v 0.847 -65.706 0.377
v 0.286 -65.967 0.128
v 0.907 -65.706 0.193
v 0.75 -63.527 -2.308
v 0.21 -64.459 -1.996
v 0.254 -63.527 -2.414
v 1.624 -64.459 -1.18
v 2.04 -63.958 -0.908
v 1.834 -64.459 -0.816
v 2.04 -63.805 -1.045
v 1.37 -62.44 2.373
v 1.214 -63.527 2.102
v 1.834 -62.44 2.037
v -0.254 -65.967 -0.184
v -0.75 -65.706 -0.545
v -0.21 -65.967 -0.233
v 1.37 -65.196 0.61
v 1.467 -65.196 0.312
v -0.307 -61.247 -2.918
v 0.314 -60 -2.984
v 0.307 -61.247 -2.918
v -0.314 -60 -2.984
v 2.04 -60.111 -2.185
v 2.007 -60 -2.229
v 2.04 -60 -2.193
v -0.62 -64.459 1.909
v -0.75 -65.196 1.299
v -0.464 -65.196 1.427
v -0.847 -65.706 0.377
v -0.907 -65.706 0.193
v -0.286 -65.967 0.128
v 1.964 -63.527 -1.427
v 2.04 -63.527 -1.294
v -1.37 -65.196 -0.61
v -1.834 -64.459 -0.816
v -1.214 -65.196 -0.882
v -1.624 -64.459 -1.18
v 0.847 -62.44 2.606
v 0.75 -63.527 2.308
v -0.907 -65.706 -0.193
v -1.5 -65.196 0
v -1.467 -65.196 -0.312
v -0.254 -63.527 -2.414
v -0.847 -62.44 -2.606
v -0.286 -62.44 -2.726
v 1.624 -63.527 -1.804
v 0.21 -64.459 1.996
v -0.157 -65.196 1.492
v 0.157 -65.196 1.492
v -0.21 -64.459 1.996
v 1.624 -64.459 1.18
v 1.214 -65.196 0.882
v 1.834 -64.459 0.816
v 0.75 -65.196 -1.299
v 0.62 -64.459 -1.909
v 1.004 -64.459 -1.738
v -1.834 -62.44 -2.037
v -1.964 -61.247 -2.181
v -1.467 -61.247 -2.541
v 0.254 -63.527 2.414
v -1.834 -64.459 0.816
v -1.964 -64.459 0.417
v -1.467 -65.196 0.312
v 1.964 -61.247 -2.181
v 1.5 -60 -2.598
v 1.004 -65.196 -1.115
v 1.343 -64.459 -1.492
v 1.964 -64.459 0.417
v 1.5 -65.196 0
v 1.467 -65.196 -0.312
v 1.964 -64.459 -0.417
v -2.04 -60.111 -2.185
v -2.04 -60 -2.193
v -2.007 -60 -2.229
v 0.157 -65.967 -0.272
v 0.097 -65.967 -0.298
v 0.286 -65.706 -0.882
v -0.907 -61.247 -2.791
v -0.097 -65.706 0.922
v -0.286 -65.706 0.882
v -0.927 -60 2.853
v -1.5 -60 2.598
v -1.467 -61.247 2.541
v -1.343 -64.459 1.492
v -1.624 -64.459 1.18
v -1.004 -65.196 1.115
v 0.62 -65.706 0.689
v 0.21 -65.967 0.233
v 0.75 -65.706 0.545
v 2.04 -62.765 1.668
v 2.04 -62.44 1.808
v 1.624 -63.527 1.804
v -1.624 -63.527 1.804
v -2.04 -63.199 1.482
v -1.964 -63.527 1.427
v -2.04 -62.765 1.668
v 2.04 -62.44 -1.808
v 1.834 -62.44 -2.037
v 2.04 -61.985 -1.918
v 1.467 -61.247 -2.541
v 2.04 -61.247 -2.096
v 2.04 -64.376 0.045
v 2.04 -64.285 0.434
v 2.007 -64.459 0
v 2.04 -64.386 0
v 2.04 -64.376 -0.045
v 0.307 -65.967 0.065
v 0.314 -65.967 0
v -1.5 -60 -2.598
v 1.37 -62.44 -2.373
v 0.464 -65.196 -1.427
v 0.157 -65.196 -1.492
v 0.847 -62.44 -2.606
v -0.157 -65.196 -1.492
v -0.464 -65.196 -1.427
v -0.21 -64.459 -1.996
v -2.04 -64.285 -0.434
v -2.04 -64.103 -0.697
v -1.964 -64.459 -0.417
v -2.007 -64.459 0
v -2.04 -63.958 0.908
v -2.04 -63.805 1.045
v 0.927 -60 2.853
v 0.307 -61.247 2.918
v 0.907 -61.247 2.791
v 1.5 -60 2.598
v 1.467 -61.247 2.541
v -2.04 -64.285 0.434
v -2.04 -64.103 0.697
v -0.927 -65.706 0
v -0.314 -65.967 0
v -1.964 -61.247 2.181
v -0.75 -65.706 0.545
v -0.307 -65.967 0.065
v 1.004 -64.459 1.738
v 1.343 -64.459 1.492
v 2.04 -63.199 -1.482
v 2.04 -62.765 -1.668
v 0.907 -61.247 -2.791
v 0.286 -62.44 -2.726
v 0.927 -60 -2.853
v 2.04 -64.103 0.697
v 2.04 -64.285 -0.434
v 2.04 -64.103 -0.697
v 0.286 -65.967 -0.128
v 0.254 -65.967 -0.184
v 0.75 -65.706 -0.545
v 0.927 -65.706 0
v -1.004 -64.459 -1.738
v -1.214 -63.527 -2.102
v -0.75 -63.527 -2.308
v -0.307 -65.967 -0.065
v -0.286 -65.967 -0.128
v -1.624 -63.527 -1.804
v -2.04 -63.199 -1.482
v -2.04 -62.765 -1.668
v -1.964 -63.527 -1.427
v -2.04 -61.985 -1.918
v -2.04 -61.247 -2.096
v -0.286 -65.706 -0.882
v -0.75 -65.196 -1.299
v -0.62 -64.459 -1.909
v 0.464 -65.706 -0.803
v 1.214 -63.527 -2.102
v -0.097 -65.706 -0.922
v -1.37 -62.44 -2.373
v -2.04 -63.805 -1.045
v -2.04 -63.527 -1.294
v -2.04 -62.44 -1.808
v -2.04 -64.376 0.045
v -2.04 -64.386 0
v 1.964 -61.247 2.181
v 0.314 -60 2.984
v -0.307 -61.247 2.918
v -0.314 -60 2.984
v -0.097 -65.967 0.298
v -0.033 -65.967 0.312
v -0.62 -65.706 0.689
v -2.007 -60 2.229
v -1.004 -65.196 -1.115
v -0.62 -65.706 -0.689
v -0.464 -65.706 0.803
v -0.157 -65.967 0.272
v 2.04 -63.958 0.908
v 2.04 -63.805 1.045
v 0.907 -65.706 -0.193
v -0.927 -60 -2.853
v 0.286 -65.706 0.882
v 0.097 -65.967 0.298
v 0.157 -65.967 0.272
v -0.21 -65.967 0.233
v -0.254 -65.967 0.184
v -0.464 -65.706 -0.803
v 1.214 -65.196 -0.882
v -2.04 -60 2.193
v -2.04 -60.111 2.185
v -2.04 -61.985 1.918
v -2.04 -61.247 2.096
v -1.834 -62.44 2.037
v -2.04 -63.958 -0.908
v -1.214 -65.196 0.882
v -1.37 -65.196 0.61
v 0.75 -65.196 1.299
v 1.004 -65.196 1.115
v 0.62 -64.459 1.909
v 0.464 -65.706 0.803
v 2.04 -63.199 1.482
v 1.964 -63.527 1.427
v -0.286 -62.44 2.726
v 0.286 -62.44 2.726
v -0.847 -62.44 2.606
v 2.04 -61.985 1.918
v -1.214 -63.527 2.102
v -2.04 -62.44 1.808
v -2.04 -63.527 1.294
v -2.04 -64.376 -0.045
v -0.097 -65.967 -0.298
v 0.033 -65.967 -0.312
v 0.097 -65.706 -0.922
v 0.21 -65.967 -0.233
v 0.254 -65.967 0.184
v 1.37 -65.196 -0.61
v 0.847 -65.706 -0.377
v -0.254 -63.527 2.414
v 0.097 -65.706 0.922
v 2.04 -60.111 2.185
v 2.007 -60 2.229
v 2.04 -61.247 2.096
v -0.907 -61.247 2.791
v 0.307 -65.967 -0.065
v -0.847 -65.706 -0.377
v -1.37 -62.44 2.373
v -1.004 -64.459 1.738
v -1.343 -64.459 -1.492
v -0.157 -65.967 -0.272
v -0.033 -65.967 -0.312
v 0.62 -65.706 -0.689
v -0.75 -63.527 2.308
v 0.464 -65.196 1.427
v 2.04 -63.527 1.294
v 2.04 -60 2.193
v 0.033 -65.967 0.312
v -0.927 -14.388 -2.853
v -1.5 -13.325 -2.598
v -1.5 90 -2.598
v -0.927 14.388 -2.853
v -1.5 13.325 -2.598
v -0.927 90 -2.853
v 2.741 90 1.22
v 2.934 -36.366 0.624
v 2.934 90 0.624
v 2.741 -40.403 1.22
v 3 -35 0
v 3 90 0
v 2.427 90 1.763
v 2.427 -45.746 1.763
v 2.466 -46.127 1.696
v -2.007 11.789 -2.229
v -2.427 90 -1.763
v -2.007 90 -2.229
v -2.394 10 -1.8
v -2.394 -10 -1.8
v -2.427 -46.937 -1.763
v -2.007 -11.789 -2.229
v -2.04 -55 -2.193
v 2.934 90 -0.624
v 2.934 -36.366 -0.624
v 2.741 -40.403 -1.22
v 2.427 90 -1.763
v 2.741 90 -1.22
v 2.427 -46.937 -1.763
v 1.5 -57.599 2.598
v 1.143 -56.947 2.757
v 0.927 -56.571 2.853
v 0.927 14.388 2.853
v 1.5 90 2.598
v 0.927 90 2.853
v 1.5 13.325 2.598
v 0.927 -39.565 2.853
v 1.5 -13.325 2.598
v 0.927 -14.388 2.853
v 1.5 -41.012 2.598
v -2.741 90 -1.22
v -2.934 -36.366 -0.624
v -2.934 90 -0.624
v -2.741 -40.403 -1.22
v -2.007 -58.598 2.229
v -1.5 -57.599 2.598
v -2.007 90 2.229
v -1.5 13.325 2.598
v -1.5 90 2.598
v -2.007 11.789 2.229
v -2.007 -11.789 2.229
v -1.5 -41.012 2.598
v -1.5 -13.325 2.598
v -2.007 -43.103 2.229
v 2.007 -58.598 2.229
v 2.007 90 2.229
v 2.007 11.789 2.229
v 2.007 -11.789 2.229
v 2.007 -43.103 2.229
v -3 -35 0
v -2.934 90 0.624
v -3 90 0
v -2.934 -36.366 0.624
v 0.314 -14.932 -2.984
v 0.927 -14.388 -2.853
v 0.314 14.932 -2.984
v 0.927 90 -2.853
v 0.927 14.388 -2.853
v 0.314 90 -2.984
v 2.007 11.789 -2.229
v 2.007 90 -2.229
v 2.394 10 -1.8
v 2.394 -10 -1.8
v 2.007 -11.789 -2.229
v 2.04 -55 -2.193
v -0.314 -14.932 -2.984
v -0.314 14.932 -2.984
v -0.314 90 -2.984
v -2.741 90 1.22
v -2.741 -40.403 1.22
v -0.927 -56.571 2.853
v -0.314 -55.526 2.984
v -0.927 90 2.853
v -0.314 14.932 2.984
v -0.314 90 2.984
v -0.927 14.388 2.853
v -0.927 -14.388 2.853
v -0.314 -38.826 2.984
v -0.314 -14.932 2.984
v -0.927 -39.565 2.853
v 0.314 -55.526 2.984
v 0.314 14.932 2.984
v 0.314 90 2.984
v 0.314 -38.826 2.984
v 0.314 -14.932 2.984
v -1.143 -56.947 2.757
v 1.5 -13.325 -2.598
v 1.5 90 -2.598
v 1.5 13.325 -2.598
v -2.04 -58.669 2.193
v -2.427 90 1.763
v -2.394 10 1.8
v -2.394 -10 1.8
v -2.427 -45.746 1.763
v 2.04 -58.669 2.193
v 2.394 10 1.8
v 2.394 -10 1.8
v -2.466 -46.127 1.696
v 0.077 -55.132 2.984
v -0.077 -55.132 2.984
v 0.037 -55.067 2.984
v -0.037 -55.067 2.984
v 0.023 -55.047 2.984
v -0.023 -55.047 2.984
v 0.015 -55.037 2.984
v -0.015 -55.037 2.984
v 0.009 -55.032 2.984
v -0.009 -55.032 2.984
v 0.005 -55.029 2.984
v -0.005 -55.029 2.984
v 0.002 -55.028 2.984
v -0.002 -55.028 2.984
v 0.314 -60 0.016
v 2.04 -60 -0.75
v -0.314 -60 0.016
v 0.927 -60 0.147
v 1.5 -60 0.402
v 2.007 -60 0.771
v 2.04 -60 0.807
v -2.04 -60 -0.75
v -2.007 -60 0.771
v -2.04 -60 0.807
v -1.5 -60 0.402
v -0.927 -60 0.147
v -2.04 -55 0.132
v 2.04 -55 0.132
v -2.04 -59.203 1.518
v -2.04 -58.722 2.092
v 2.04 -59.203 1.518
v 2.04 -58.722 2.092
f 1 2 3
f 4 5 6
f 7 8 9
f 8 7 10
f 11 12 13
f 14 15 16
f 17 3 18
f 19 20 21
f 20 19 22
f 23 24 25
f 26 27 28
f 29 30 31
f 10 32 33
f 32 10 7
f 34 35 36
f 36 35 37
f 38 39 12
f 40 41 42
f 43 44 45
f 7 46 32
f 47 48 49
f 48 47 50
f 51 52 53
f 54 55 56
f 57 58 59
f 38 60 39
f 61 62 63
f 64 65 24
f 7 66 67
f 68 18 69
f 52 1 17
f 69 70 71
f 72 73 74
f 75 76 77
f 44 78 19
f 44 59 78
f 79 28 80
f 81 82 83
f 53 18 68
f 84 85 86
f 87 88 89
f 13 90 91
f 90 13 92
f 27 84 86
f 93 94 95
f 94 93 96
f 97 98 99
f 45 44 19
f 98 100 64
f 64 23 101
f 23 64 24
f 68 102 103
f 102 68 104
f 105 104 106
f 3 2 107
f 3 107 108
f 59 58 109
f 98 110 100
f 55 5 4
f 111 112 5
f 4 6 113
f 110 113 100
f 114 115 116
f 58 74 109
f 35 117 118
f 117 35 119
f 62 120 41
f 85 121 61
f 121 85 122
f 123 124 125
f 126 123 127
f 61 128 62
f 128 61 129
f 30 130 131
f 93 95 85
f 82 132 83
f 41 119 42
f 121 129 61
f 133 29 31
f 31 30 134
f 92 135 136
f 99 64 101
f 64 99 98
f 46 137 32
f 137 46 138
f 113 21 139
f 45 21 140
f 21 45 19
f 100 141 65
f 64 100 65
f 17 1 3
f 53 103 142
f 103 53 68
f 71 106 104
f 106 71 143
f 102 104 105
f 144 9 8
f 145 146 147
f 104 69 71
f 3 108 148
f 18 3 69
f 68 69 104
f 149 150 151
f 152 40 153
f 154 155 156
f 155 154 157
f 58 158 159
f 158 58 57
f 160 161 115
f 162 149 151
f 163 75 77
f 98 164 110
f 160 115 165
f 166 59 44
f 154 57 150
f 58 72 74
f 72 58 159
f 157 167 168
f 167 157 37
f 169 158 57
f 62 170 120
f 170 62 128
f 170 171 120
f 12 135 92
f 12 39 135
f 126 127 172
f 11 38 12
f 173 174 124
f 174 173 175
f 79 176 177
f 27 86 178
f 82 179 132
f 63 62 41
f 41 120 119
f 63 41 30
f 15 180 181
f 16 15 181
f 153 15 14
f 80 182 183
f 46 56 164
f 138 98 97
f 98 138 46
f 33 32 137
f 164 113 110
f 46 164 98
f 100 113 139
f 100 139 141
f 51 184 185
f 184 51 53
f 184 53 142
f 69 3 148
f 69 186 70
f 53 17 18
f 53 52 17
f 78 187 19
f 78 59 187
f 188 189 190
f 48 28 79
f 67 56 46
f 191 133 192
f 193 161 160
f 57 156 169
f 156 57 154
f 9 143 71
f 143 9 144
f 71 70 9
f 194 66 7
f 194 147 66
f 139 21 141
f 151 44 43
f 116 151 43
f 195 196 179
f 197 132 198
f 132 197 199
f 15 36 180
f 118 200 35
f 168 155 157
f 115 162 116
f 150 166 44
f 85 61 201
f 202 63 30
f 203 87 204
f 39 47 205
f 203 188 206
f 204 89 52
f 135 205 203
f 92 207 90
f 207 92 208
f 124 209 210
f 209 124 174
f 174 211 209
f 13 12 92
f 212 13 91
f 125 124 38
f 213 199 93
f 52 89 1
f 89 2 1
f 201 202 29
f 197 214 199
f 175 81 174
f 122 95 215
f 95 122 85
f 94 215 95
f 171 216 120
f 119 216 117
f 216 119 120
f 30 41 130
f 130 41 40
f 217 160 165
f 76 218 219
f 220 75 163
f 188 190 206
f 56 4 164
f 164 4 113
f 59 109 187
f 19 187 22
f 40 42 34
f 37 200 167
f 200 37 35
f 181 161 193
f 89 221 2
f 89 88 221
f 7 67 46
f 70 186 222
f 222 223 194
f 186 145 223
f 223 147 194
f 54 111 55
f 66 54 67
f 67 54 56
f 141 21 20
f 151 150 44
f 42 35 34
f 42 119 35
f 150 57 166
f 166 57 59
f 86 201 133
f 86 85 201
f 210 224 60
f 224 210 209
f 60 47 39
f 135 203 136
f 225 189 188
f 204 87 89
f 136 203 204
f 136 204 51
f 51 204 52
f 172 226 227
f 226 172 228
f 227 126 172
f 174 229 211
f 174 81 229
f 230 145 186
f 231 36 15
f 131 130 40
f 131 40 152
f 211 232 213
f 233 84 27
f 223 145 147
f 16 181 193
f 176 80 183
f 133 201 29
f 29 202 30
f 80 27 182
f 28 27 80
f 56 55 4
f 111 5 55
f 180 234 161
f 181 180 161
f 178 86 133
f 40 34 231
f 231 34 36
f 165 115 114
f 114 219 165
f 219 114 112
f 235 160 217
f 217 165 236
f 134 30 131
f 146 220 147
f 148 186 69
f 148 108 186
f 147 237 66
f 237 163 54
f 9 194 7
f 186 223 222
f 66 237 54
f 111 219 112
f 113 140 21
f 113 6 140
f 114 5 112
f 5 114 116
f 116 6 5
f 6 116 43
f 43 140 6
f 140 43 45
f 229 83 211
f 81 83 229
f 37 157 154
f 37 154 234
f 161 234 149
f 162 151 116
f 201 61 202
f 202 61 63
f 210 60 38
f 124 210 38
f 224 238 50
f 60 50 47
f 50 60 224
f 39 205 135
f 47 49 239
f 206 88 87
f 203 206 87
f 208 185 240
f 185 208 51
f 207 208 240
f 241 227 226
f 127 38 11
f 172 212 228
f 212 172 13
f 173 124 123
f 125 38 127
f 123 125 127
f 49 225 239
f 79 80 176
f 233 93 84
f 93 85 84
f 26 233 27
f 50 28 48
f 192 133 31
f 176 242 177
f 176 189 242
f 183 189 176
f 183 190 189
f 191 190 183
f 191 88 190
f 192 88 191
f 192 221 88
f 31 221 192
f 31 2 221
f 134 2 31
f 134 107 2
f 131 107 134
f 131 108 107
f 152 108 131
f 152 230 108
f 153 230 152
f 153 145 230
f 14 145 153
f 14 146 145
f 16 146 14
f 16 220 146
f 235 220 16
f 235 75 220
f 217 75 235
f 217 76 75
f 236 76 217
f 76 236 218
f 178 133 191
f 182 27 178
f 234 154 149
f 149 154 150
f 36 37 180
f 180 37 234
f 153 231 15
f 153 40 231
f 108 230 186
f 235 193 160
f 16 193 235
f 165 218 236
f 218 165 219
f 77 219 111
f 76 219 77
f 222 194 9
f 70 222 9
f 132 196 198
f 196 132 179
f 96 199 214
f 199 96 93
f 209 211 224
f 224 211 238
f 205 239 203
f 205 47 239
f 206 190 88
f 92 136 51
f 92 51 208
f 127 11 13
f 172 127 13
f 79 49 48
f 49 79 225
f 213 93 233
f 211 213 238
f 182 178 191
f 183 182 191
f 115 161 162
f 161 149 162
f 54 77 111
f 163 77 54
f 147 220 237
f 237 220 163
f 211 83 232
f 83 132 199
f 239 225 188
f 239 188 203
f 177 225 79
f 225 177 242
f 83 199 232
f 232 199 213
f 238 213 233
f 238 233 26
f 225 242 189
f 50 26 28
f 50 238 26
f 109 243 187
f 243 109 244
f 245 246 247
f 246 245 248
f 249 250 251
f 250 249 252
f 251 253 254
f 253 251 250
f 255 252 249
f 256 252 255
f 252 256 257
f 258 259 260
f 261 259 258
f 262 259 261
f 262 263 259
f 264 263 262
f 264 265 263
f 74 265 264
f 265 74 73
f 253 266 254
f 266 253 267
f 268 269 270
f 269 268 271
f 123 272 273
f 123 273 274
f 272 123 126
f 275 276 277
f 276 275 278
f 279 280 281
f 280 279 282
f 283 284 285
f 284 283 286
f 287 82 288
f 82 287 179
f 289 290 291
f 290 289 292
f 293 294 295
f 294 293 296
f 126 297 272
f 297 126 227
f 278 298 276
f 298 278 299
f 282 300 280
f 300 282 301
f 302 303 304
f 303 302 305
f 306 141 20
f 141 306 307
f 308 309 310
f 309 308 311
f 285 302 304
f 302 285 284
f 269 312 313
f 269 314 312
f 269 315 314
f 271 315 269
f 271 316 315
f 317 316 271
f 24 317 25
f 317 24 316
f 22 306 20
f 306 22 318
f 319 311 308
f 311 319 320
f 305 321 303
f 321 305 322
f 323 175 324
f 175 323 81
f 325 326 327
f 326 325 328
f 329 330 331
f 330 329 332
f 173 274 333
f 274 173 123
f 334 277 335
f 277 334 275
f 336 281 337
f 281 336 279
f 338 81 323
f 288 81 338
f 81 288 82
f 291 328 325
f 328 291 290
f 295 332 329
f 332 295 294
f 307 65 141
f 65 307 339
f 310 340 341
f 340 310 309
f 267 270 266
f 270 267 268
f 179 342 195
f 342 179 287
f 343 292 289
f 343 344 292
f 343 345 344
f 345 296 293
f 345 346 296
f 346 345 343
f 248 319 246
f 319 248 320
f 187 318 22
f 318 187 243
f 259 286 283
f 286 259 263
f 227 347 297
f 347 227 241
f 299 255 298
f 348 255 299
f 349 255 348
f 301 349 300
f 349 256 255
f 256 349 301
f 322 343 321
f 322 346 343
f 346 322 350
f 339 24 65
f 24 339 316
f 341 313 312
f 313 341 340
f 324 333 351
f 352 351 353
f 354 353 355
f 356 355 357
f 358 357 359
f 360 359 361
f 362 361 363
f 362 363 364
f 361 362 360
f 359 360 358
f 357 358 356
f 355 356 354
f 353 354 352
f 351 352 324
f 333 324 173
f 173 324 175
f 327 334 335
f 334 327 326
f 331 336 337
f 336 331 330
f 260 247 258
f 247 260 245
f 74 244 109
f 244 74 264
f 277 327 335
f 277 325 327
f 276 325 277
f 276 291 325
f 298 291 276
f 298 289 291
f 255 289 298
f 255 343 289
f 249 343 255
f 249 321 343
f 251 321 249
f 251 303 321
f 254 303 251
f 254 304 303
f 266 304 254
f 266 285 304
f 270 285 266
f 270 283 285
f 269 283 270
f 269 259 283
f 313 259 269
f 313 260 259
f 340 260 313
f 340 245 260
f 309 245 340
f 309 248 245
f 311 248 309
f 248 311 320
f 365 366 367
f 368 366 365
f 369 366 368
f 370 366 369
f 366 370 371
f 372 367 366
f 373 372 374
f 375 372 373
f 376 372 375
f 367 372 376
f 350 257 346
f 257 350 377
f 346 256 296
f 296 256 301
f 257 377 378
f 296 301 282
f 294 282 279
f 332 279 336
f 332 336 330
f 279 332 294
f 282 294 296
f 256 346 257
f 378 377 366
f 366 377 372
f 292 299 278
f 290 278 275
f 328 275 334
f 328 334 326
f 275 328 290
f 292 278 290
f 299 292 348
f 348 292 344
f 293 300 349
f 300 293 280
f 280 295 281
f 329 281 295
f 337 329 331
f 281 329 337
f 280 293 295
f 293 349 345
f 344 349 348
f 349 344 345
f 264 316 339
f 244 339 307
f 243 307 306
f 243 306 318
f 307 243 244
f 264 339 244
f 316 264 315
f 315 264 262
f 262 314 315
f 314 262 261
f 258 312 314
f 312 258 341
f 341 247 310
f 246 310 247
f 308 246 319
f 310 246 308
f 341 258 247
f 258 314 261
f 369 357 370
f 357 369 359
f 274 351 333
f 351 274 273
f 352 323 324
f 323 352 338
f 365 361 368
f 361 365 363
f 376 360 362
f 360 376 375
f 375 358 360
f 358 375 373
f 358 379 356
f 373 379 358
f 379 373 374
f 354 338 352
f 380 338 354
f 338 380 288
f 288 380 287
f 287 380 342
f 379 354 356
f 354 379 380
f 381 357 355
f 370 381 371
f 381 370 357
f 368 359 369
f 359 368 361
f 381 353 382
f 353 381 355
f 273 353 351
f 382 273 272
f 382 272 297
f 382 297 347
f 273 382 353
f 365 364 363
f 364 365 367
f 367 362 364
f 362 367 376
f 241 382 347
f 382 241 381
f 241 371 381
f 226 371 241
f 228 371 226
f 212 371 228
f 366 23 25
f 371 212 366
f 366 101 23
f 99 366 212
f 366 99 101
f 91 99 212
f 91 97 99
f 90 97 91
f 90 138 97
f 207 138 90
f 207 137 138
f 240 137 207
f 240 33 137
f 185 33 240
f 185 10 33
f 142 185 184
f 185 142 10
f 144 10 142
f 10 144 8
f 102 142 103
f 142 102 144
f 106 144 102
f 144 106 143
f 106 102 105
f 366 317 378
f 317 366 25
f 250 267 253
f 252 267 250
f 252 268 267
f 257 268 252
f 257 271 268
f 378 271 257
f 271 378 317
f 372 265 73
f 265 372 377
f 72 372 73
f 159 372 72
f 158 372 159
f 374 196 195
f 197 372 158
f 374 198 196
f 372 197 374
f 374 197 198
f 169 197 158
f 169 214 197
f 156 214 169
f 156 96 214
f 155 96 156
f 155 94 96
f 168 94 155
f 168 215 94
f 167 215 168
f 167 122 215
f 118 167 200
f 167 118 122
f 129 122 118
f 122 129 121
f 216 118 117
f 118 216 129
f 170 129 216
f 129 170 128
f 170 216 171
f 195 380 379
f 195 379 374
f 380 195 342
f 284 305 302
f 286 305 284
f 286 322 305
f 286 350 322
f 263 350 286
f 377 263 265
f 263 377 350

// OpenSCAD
/* [Overall size] */
// The diameter of the hook in mm - see http://www.karpstyles.com/crochet/hook-chart.html for US and UK sizes
diameter = 6;
d = diameter;
r = diameter/2;
length = 150; // [30:300]
/* [Hook and throat] */
// How sharply the throat slopes down from the shaft (in degrees)
throat_angle = 10;
hook_lower_angle = 90 - throat_angle;
// The length of the pointy curled-over bit
hook_length = 5;
// How long the narrowed section at the point is
narrowing_length = 10;
// How long the sloping section from shaft to narrowing is
narrowing_slope = 20;
// How much the throat narrows on each side, as a fraction of the diameter
narrowing_ratio = 0.16;
narrowing_depth = d * narrowing_ratio;
/* [Thumb rest] */
// The length of the thumb rest
grip_length = 20;
// How long the sloping sections from shaft and handle to thumb rest are
grip_slope=5;
// How thick the thumb rest is, as a fraction of the diameter
grip_thickness = 0.6;
grip_depth=d * (1 - grip_thickness)/2;
// Distance from the centre-point of the thumb rest to the tip of the point
length_above_grip = 60;
// measured from the centre-point of the thumb rest to the end of the handle
length_below_grip = length - length_above_grip;
/* [Hidden] */
hook_upper_angle = 0;

$fn = 30;

// Right-angled triangle with interior angle <angle>.
module triangle(radius, angle)
{
  o=radius*sin(angle);
  a=radius*cos(angle);
  polygon(points=[[0,0], [a,0], [a,o]]);
}

// module triangle_prism() copied from:
// https://github.com/elmom/MCAD/blob/master/regular_shapes.scad
module triangle_prism(height, radius, angle)
{
  linear_extrude(height=height, center = true) triangle(radius, angle);
}

module trapezium_prism(trap_height, flat_width, slope_width, height)
{
  max_x = slope_width + flat_width/2;
  linear_extrude(height=height, center=true)
    polygon(points=[[-max_x, 0],
                    [-flat_width/2, trap_height],
                    [flat_width/2, trap_height],
                    [max_x, 0]]);
}

module grip_side()
{
	trapezium_prism(grip_depth, grip_length, grip_slope, d);
}

module grip()
{
        translate([0, r, 0])
                rotate(a=[0, 90, 180])
                        grip_side();
        translate([0, -r, 0])
                rotate(a=[0, 90, 0])
                        grip_side();
}

module narrowing_side()
{
	trapezium_prism(narrowing_depth, narrowing_length, narrowing_slope, d);
}

module narrowing()
{
        translate(v=[r, 0, length_above_grip])
                rotate(a=[-90, 90, 0])
                        narrowing_side();
        translate(v=[-r, 0, length_above_grip])
                rotate(a=[-90, 90, 180])
                        narrowing_side();
}

module outer_shell()
{
        union()
        {
                translate (v=[0, 0, length_above_grip])
                        scale([1.0, 1.0, 2.0])
                        sphere(r = r, anglesteps = 10, sweepsteps = 10);
                translate (v=[0, 0, -length_below_grip])
                        cylinder(r = r, h = length);
        }
}

module throat()
{
        translate (v= [0 , -r/4, length_above_grip])
                rotate(a=[270, 0, 90])
                difference() {
                        triangle_prism(d, 4*d, hook_lower_angle);
                        triangle_prism(d, 4*d, hook_upper_angle);
                }
}

module hook()
{
        intersection() {
                outer_shell();
                translate(v=[0, r, length_above_grip - hook_length])
                        cylinder(h=hook_length, r1=0, r2=r, center=false);
        }
}

rotate(a=[90, 0, 0]) {
        difference() {
                union() {
                        difference()
                        {
                                outer_shell();
                                throat();
                                grip();
                        }
                        hook();
                }
		// Narrow the head, for Greater Pointiness
                narrowing();
        }
}
